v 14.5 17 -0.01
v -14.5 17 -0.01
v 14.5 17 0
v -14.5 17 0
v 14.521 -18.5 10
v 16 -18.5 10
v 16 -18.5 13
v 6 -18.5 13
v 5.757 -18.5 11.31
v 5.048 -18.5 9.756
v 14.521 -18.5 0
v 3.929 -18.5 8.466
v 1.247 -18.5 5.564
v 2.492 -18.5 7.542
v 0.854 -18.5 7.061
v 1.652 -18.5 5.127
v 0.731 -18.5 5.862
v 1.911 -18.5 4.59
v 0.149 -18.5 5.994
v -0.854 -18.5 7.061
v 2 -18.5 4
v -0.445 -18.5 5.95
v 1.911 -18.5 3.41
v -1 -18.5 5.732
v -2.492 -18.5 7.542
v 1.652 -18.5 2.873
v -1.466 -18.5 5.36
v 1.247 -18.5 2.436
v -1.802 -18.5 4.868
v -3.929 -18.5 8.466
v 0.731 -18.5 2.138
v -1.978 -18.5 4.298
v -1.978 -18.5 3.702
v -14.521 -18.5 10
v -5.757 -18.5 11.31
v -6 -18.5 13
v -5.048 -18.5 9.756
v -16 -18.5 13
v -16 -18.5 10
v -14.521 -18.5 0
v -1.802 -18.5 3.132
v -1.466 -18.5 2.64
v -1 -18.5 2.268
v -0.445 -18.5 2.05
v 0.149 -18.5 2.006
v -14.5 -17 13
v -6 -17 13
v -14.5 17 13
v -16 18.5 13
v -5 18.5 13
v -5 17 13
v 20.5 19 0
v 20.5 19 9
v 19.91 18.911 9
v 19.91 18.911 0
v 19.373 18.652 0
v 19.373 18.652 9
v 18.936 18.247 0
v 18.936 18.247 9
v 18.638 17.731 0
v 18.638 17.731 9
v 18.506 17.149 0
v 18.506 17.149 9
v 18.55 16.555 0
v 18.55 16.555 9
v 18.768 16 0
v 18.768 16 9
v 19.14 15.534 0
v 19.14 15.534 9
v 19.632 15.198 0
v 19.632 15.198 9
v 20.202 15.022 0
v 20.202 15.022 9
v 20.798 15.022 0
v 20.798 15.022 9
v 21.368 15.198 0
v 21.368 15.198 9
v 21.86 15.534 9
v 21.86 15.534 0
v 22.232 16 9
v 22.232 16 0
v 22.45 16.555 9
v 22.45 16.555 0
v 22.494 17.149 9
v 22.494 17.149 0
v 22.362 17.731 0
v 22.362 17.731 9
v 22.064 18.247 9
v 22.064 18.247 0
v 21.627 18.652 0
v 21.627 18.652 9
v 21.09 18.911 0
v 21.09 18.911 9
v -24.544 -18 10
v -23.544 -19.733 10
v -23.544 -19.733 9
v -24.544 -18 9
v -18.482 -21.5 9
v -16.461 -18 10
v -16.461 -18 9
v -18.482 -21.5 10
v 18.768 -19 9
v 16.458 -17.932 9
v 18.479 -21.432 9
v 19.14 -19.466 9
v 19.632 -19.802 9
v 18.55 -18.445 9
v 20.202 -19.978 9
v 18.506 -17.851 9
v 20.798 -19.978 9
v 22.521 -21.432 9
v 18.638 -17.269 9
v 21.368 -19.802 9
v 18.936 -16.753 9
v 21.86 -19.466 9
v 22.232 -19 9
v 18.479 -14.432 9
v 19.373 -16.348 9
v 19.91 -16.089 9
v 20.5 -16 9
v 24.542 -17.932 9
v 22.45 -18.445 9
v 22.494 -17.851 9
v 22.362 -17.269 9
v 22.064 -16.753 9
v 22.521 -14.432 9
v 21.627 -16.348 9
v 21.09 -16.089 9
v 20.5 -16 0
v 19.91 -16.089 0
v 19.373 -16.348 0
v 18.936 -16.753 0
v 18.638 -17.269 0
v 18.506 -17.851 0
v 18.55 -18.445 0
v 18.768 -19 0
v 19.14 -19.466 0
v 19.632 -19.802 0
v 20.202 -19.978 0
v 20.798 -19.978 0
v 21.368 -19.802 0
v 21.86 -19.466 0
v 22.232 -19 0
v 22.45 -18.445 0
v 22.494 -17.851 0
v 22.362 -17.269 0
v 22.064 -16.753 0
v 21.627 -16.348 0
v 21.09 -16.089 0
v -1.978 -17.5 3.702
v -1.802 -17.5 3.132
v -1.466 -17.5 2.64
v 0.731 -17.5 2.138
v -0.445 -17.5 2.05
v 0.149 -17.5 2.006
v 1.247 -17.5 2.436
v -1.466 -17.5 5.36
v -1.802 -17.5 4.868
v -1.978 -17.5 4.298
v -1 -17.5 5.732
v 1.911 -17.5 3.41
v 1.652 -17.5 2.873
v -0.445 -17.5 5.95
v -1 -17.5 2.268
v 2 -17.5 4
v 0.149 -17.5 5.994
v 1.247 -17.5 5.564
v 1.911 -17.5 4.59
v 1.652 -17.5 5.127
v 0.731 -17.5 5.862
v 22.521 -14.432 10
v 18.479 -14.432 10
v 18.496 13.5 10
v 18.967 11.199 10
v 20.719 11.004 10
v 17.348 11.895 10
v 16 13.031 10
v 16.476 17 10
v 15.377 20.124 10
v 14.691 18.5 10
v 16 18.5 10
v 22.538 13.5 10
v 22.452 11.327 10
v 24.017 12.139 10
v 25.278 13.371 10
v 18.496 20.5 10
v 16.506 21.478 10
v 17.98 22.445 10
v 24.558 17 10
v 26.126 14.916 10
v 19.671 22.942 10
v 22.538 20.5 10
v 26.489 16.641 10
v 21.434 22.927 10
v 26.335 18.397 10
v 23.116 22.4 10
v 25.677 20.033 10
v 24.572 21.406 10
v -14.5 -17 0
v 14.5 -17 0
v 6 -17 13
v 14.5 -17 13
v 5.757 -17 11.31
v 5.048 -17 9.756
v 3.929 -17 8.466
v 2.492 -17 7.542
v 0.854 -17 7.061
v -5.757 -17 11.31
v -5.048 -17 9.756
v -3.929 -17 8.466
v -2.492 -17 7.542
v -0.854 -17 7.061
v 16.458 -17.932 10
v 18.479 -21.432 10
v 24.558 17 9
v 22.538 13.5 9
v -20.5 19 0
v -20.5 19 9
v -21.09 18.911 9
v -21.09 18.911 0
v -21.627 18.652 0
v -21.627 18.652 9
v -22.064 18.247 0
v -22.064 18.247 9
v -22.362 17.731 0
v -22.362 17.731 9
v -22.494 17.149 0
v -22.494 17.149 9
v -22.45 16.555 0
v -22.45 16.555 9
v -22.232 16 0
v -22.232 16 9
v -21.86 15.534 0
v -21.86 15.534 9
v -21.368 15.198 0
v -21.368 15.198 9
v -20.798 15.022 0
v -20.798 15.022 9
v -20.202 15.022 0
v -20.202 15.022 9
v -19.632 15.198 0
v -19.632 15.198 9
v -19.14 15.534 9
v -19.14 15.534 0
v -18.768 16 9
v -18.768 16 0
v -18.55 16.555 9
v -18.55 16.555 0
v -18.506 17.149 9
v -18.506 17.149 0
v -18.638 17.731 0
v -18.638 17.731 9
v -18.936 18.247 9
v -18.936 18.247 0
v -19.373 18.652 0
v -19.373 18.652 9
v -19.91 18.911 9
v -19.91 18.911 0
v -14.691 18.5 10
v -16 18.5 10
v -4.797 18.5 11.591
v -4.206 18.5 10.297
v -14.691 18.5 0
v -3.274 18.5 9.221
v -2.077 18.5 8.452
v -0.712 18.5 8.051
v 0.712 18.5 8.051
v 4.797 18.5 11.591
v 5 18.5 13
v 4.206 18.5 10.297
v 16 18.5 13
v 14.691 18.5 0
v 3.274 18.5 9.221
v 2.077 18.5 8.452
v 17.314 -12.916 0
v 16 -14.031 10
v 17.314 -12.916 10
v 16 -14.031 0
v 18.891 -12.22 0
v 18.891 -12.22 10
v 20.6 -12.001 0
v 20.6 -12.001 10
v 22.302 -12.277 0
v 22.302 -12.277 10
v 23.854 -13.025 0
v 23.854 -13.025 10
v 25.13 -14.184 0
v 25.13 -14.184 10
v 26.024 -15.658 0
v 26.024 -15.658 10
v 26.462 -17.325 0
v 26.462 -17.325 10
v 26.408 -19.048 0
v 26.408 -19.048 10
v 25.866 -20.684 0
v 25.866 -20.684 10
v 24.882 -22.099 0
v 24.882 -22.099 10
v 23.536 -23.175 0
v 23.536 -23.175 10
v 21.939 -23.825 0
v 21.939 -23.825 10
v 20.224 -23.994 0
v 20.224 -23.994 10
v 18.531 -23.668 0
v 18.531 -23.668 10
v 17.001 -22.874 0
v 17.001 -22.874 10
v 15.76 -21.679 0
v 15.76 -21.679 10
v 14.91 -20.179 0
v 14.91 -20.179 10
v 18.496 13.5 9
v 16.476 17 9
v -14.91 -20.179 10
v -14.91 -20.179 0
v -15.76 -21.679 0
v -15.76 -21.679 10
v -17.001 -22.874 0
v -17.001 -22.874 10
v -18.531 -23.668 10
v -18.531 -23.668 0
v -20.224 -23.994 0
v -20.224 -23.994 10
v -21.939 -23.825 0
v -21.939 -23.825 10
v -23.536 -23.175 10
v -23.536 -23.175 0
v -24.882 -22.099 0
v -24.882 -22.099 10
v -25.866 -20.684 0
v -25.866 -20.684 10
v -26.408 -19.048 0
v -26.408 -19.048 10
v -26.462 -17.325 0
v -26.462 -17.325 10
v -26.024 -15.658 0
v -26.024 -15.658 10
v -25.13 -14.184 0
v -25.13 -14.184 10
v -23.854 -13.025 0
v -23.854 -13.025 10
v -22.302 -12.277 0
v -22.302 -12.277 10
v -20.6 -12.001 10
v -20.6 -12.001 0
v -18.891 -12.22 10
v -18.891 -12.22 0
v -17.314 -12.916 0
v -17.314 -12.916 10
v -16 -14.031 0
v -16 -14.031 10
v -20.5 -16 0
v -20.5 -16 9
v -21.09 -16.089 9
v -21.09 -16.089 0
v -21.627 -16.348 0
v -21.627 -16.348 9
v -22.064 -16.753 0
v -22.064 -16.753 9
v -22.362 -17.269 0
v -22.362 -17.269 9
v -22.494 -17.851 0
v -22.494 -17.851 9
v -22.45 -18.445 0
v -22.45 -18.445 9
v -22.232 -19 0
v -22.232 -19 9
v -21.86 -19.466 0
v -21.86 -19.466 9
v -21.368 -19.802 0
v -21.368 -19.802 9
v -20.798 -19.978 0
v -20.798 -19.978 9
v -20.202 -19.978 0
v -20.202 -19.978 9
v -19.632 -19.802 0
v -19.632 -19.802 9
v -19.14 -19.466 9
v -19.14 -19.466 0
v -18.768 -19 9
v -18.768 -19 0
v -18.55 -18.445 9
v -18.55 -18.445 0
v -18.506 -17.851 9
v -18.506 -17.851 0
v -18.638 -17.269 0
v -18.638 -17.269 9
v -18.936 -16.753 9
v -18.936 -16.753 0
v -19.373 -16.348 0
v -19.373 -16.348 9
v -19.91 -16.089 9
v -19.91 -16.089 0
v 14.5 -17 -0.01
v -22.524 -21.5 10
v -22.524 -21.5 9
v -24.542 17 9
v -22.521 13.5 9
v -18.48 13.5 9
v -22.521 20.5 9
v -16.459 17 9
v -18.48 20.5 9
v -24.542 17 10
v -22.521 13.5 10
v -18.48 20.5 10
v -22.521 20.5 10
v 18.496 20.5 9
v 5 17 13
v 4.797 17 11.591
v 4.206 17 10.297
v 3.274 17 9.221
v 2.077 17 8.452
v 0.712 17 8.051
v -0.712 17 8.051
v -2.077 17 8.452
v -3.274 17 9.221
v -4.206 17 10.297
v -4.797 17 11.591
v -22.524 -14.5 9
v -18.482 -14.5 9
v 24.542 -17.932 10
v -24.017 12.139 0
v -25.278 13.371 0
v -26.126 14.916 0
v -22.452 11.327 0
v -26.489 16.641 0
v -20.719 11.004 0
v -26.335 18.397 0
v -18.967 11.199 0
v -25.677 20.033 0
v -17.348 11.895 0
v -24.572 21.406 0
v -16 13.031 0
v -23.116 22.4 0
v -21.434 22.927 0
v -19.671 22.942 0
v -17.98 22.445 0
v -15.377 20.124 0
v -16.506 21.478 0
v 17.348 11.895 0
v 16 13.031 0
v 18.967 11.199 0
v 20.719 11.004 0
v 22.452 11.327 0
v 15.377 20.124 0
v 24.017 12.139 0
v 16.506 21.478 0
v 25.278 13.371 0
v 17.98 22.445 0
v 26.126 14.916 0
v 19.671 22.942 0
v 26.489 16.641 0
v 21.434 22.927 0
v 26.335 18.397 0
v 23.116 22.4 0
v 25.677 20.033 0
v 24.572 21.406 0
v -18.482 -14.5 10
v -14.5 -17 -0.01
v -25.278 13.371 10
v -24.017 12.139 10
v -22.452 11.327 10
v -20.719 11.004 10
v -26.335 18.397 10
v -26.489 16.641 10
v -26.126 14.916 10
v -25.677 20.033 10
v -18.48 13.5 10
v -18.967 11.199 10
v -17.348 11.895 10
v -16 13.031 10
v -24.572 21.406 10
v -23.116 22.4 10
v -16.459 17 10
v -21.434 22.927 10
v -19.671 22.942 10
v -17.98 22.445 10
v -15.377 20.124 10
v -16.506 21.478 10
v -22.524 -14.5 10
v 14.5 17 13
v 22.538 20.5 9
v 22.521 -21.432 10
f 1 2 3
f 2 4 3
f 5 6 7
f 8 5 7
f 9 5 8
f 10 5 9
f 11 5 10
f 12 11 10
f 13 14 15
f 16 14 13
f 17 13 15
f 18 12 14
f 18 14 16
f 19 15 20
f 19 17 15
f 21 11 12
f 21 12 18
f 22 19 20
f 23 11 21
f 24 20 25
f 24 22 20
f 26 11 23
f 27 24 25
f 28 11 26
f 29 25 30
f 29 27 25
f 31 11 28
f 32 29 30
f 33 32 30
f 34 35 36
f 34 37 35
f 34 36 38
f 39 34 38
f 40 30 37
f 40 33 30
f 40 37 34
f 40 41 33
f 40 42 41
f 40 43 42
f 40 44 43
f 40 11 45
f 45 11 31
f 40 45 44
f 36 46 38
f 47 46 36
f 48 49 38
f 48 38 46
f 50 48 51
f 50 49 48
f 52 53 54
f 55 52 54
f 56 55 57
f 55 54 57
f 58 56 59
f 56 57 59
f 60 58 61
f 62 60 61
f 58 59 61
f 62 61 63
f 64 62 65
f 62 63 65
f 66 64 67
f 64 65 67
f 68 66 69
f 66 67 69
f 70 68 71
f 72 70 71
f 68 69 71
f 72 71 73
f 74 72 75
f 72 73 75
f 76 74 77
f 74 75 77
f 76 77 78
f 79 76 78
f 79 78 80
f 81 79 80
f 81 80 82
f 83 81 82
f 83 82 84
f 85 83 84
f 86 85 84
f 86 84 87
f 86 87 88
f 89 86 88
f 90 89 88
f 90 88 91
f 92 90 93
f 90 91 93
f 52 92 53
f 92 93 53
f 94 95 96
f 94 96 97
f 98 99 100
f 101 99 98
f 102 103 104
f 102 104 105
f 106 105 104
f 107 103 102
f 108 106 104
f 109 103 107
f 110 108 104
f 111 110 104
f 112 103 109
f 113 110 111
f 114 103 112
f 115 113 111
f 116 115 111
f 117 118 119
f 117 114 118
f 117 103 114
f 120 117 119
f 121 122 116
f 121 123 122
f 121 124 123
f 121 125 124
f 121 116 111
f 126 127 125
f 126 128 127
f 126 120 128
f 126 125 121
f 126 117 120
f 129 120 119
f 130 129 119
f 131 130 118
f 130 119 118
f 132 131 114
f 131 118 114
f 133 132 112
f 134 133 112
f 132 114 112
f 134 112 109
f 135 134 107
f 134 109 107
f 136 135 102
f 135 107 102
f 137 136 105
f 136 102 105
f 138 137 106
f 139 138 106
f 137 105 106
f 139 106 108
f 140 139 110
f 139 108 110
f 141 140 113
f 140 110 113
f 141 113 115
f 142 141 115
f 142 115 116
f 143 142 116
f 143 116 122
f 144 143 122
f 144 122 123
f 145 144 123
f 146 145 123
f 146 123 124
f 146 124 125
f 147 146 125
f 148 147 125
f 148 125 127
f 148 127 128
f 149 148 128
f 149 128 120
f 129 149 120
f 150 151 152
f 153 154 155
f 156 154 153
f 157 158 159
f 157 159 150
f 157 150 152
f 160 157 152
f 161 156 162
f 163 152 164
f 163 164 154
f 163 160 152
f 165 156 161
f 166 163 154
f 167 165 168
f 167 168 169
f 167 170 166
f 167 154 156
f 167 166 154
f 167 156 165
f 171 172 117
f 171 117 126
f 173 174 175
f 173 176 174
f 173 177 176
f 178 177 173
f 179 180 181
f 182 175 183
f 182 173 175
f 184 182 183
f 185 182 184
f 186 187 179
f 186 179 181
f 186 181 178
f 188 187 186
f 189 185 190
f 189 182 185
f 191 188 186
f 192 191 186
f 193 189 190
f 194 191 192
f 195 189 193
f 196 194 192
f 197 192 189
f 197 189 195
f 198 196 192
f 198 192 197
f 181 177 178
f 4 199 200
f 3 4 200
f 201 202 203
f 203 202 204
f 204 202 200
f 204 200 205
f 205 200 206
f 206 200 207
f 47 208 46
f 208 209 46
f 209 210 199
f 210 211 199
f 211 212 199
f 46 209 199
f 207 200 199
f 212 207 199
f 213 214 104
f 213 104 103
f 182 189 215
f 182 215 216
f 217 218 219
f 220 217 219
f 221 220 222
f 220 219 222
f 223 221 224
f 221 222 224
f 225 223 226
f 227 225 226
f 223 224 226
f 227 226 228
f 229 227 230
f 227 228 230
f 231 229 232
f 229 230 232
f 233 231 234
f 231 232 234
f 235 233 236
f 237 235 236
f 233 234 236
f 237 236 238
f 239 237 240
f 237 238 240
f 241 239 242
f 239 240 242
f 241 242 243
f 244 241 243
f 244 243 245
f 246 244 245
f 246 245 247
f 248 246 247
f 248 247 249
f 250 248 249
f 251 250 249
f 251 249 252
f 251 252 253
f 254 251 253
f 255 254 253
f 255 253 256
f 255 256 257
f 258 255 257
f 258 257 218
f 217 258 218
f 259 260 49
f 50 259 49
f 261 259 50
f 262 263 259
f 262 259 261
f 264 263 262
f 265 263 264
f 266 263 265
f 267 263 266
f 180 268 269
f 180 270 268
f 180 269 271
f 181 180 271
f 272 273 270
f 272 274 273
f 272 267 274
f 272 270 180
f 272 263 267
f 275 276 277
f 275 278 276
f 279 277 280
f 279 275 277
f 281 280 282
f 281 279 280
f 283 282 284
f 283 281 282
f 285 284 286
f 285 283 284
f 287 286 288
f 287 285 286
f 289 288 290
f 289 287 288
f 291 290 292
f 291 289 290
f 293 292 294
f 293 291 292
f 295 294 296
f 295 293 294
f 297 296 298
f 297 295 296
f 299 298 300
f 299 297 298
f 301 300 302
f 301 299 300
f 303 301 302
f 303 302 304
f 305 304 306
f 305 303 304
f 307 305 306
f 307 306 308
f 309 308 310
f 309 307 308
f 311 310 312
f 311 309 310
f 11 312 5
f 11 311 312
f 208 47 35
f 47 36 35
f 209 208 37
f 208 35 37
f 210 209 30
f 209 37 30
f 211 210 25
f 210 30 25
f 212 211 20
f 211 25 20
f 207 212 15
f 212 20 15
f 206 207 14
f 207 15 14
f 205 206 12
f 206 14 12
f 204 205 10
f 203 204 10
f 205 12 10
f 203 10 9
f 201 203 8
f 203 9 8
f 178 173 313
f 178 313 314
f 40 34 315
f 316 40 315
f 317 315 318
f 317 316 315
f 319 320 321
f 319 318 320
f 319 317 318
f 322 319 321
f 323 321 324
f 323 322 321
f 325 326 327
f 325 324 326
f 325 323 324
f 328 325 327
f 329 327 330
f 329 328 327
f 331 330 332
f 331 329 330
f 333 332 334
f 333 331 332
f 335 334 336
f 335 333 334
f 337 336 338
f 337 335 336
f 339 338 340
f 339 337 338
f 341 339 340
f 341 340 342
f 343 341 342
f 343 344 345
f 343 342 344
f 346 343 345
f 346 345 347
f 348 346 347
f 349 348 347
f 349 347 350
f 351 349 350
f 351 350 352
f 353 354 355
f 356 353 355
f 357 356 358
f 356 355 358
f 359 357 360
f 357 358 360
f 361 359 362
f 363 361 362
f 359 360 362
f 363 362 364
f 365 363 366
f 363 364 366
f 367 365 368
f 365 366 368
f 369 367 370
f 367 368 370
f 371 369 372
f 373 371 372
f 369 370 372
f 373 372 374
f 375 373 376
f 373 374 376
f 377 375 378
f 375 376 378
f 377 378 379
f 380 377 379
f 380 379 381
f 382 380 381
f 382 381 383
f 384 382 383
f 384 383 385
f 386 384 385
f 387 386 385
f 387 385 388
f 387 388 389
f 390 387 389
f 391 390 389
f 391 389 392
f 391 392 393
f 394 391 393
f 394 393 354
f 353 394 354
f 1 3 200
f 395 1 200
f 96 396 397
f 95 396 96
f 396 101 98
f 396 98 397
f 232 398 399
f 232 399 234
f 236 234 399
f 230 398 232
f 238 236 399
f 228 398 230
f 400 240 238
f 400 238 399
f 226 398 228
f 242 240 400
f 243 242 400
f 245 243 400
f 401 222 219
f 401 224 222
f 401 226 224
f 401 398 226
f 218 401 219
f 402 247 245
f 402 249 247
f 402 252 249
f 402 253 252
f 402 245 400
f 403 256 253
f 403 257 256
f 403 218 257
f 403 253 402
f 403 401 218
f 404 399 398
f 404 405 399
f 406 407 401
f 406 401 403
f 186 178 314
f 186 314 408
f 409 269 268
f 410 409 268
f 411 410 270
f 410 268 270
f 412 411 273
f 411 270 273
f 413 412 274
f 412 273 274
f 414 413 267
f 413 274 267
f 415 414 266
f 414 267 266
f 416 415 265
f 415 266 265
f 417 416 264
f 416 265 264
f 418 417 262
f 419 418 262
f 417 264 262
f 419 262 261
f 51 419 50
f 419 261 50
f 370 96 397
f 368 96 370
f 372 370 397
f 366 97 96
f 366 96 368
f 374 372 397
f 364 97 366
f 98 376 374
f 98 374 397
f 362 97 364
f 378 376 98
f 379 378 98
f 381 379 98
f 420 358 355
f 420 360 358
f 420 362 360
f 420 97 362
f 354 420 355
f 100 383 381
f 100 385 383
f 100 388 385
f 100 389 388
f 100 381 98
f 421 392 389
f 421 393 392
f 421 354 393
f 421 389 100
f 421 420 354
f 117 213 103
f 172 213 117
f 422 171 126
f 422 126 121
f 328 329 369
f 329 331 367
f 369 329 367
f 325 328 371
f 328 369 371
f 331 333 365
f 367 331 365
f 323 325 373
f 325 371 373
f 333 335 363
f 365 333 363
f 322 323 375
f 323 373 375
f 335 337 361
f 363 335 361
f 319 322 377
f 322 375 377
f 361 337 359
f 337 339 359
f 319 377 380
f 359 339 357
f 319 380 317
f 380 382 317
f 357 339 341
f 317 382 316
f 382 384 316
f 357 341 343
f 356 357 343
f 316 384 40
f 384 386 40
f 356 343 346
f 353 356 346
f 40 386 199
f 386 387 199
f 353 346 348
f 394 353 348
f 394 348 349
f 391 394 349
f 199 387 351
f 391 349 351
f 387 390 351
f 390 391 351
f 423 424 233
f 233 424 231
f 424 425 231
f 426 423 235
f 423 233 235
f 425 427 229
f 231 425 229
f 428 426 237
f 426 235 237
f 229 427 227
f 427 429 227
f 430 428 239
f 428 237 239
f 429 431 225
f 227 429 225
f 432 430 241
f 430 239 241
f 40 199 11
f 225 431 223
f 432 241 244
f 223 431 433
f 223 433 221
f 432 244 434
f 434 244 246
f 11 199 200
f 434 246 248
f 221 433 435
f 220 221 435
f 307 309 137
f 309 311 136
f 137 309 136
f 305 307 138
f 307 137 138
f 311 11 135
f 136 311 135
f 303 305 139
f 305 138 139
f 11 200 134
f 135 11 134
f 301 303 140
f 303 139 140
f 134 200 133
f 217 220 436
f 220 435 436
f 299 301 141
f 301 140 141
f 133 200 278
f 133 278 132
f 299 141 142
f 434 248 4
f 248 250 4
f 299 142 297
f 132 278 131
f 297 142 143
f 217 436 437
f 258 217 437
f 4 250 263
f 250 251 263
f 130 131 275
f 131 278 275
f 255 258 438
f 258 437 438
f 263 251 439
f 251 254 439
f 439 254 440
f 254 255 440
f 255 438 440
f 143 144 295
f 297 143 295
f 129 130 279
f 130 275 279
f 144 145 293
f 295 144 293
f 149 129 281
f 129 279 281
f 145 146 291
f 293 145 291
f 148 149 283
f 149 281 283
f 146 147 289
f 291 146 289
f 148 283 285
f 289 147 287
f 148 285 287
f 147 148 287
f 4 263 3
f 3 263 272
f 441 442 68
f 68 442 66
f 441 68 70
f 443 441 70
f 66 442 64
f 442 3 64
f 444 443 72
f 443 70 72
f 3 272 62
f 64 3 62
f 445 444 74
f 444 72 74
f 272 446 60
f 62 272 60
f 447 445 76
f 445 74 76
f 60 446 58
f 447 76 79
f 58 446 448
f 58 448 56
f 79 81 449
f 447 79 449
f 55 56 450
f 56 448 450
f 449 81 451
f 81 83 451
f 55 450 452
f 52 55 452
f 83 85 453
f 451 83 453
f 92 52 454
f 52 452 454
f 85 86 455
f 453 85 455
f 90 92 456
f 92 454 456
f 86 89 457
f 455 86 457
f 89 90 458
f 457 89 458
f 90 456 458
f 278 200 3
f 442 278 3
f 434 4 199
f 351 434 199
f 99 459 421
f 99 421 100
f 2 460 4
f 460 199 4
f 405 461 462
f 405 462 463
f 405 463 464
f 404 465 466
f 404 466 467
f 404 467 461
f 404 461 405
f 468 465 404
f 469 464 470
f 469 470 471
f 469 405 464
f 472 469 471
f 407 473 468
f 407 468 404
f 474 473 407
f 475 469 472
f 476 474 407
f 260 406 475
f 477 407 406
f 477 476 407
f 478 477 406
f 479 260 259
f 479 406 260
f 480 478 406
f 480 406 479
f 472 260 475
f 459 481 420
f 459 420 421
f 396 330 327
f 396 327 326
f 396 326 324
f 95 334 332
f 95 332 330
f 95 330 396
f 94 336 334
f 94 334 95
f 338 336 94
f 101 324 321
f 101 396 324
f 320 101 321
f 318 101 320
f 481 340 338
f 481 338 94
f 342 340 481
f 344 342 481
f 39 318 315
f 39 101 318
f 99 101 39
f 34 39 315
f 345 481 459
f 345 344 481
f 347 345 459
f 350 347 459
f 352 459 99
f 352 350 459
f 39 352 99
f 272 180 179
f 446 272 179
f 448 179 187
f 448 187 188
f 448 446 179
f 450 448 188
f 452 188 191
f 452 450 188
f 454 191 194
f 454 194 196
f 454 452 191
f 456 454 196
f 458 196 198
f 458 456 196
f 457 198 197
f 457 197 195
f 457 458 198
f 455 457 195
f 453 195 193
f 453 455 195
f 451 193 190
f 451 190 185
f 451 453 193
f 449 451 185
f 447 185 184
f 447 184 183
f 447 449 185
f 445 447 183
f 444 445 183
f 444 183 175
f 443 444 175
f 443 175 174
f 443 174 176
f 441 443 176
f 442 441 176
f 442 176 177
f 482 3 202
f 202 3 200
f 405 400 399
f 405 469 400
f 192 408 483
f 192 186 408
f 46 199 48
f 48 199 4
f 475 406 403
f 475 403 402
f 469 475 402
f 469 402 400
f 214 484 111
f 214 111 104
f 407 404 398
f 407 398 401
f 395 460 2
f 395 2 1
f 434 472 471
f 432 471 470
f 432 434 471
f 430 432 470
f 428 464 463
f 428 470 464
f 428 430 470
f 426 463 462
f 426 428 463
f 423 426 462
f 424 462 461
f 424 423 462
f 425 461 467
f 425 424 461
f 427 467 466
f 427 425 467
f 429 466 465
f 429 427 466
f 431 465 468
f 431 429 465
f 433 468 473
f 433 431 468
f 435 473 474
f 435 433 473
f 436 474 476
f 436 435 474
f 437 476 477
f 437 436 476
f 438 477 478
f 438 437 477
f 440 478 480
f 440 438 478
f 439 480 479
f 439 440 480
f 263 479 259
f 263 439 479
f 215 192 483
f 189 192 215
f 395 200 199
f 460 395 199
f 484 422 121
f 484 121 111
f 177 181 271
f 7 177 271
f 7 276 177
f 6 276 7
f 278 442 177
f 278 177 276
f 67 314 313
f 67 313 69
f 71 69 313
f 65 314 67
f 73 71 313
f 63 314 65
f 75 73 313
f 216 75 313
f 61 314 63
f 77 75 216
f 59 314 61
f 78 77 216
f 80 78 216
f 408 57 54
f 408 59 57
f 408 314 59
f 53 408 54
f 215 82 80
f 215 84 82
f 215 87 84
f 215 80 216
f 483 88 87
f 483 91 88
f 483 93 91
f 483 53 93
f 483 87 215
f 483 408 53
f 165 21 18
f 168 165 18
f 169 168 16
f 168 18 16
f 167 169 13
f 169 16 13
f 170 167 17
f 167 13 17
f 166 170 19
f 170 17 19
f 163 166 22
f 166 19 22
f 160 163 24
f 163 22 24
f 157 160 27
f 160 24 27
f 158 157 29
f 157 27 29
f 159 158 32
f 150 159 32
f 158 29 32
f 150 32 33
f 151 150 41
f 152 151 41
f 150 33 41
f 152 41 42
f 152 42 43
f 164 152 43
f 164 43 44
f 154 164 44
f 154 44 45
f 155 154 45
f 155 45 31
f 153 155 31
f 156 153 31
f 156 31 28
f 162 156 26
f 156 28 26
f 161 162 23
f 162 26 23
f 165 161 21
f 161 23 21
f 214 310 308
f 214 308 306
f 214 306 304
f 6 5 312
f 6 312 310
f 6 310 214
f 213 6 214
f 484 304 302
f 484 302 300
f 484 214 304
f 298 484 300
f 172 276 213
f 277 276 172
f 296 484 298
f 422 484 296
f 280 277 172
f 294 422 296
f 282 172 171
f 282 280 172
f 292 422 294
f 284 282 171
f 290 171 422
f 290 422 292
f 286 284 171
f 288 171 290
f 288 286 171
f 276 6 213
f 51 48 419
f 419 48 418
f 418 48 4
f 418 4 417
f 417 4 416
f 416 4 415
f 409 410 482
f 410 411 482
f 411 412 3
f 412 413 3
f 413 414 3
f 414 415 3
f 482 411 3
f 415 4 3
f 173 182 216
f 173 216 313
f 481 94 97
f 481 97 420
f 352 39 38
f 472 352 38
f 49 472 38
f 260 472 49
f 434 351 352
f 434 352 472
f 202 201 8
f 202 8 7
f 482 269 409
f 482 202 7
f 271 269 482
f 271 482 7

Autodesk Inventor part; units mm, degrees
ref_plane "YZ Plane" through (0, 0, 0) normal (1, 0, 0) x (0, 1, 0)
ref_plane "XZ Plane" through (0, 0, 0) normal (0, 1, 0) x (-1, 0, 0)
ref_plane "XY Plane" through (0, 0, 0) normal (0, 0, 1) x (1, 0, 0)
sketch "Sketch1" plane through (0, 0, 0) normal (0, 0, 1) x (1, 0, 0)
  line L0 (-37.1, 0) -> (37.1, 0) projected
  line L1 (0, -33.4) -> (0, 32.4) projected
  line L2 (-14.5, 17) -> (14.5, 17)
  line L3 (14.5, 17) -> (14.5, -17)
  line L4 (14.5, -17) -> (-14.5, -17)
  line L5 (-14.5, -17) -> (-14.5, 17)
  line L6 (-14.5, 17) -> (14.5, -17) construction
  line L7 (14.5, 17) -> (-14.5, -17) construction
  line L8 (-16, 18.5) -> (16, 18.5)
  line L9 (16, 18.5) -> (16, -18.5)
  line L10 (16, -18.5) -> (-16, -18.5)
  line L11 (-16, -18.5) -> (-16, 18.5)
  line L12 (-16, 18.5) -> (16, -18.5) construction
  line L13 (16, 18.5) -> (-16, -18.5) construction
  circle A0 centre (20.5, 17) radius 6
  circle A1 centre (20.5, -18) radius 6
  line L14 (22.5207, 13.5) -> (18.4793, 13.5)
  line L15 (18.4793, 13.5) -> (16.4585, 17)
  line L16 (16.4585, 17) -> (18.4793, 20.5)
  line L17 (18.4793, 20.5) -> (22.5207, 20.5)
  line L18 (22.5207, 20.5) -> (24.5415, 17)
  line L19 (24.5415, 17) -> (22.5207, 13.5)
  line L20 (22.5207, -21.5) -> (18.4793, -21.5)
  line L21 (18.4793, -21.5) -> (16.4585, -18)
  line L22 (16.4585, -18) -> (18.4793, -14.5)
  line L23 (18.4793, -14.5) -> (22.5207, -14.5)
  line L24 (22.5207, -14.5) -> (24.5415, -18)
  line L25 (24.5415, -18) -> (22.5207, -21.5)
  circle A2 centre (-20.5, -18) radius 6
  circle A3 centre (-20.5, 17) radius 6
  point P0 (0, 0)
  point P1 (-16, -14.0314)
  point P2 (-14.5209, -18.5)
  point P3 (-14.6905, 18.5)
  point P4 (-16, 13.0314)
  dimension "d45" = 6
  dimension "d0" = 29
  dimension "d1" = 34
  dimension "d2" = 32
  dimension "d3" = 37
  dimension "d13" = 12
  dimension "d14" = 12
  dimension "d15" = 47
  dimension "d16" = 0
  dimension "d18" = 7
  dimension "d19" = 7
extrude "Extrusion1" add sketch "Sketch1" along normal blind 13 contours L11 A3 L5 L0 | L0 L5 L4 L1 L10 A2 L11 | A2 L10 L11 | L11 L8 A3 | A3 L8 L1 L2 | L3 A0 L9 L0 | L0 L9 A1 L10 L1 L4 L3 | L1 L8 A0 L2 | A0 L8 L9 | A1 L9 L10 picked at (-15.7277, -15.917) picked at (-15.7277, 15.2503) picked at (15.7277, 15.2503) picked at (15.7655, -15.848)
extrude "Extrusion2" add sketch "Sketch1" along normal blind 10 contours A0 L8 L9 | A0 L9 L8 | L14 L15 L16 L17 L18 L19
sketch "Sketch3" plane through (-16, -18.5, 13) normal (0, -1, 0) x (1, 0, 0)
  line L0 (32, 0) -> (0, 0) projected
  arc A0 (10, 0) -> (22, 0) centre (16, 0) ccw
  point P0 (16, -13)
  dimension "d36" = 6
extrude "Extrusion6" cut sketch "Sketch3" against normal up to surface (1.5 mm away)
sketch "Sketch4" plane through (-16, 18.5, 13) normal (0, 1, 0) x (1, 0, 0)
  arc A0 (22, 0) -> (10, 0) centre (16, 0) ccw projected
  line L0 (1.5, 0) -> (30.5, 0) projected
  arc A1 (21, 0) -> (11, 0) centre (16, 0) ccw
  point P0 (16, 13)
  point P1 (11, 0)
  dimension "d39" = 5
extrude "Extrusion7" cut sketch "Sketch4" against normal up to surface (1.5 mm away) contours L0 A1
extrude "Extrusion8" add sketch "Sketch1" against normal blind 0.01 contours L5 L2 L1 L0 | L0 L1 L4 L5 | L1 L2 L3 L0 | L0 L3 L4 L1
hole "Hole2" at (20.5, 17, 0) direction (0, 0, 1) diameter 4 end through all
extrude "Extrusion10" add sketch "Sketch1" along normal blind 10 contours L11 L10 A2 picked at (-22.9633, -17.9533)
sketch "Sketch6" plane through (0, 0, 13) normal (0, 0, 1) x (1, 0, 0)
  line L0 (22.5377, 13.5) -> (18.4962, 13.5)
  line L1 (18.4962, 13.5) -> (16.4755, 17)
  line L2 (16.4755, 17) -> (18.4962, 20.5)
  line L3 (18.4962, 20.5) -> (22.5377, 20.5)
  line L4 (22.5377, 20.5) -> (24.5584, 17)
  line L5 (24.5584, 17) -> (22.5377, 13.5)
  line L6 (5, 17) -> (14.5, 17) projected
  point P0 (0, 0)
  point P1 (20.5169, 17)
  dimension "d56" = 7
extrude "Extrusion11" cut sketch "Sketch6" against normal blind 4
extrude "Extrusion12" add sketch "Sketch1" along normal blind 10 contours A1 L9 L10 | L10 L9 A1 | L20 L21 L22 L23 L24 L25
hole "Hole3" at (20.5, -18, 0) direction (0, 0, 1) diameter 4 end through all
hole "Hole4" at (-20.5, -18, 0) direction (0, 0, 1) diameter 4 end through all
sketch "Sketch7" plane through (0, 0, 13) normal (0, 0, 1) x (1, 0, 0)
  line L0 (-18.4821, -21.5) -> (-22.5236, -21.5)
  line L1 (-22.5236, -21.5) -> (-23.5436, -19.7333)
  line L2 (-24.5443, -18) -> (-22.5236, -14.5)
  line L3 (-22.5236, -14.5) -> (-18.4821, -14.5)
  line L4 (-18.4821, -14.5) -> (-16.4614, -18)
  line L5 (-16.4614, -18) -> (-18.4821, -21.5)
  line L6 (-16, -18.5) -> (-6, -18.5) projected
  line L7 (-14.5, 17) -> (-5, 17) projected
  line L8 (-23.5436, -19.7333) -> (-24.5443, -18)
  point P0 (0, 0)
  point P1 (-20.5029, -18)
  point P2 (-14.5, -18)
  dimension "d75" = 7
  dimension "d78" = 31.5
extrude "Extrusion13" add sketch "Sketch1" along normal blind 10 contours A3 L8 L11 picked at (-22.7049, 16.071)
sketch "Sketch8" plane through (0, 0, 13) normal (0, 0, 1) x (1, 0, 0)
  point P0 (0, 0)
hole "Hole5" at (-20.5, 17, 0) direction (0, 0, 1) diameter 4 end through all
sketch "Sketch9" plane through (0, 0, 13) normal (0, 0, 1) x (1, 0, 0)
  line L0 (-18.4799, 13.5) -> (-22.5213, 13.5)
  line L1 (-22.5213, 13.5) -> (-24.5421, 17)
  line L2 (-24.5421, 17) -> (-22.5213, 20.5)
  line L3 (-22.5213, 20.5) -> (-18.4799, 20.5)
  line L4 (-18.4799, 20.5) -> (-16.4592, 17)
  line L5 (-16.4592, 17) -> (-18.4799, 13.5)
  line L6 (-14.5, 17) -> (-5, 17) projected
  point P0 (0, 0)
  point P1 (-20.5006, 17)
  dimension "d89" = 7
extrude "Extrusion14" cut sketch "Sketch9" against normal blind 4
extrude "Extrusion15" cut sketch "Sketch7" against normal blind 4
sketch "Sketch10" plane through (0, 0, 13) normal (0, 0, 1) x (1, 0, 0)
  line L0 (22.5207, -21.4318) -> (18.4793, -21.4318)
  line L1 (18.4793, -21.4318) -> (16.4585, -17.9318)
  line L2 (16.4585, -17.9318) -> (18.4793, -14.4318)
  line L3 (18.4793, -14.4318) -> (22.5207, -14.4318)
  line L4 (22.5207, -14.4318) -> (24.5415, -17.9318)
  line L5 (24.5415, -17.9318) -> (22.5207, -21.4318)
  line L6 (6, -18.5) -> (-6, -18.5) projected
  arc A0 (16, 13.0314) -> (14.6905, 18.5) centre (20.5, 17) ccw projected
  point P0 (0, 0)
  point P1 (20.5, -17.9318)
  point P2 (14.5, -18)
  point P3 (15.5, 13.6834)
  point P4 (14.5839, 18)
  point P5 (15.6266, 13.5)
  point P6 (15.6266, 20.5)
  dimension "d95" = 7
  dimension "d96" = 34.9318
  dimension "d97" = 13.9659
extrude "Extrusion16" cut sketch "Sketch10" against normal blind 4
sketch "Sketch14" plane through (0, -18.5, 13) normal (0, -1, 0) x (1, 0, 0)
  circle A0 centre (0, -9) radius 2
  line L0 (-14.5209, -13) -> (14.5209, -13) projected
  point P0 (0, -13)
  dimension "d106" = 4
  dimension "d107" = 4
extrude "Extrusion18" cut sketch "Sketch14" against normal blind 1
properties part number "uchwyt_maly_silnik" material "PC/ABS Plastic"
